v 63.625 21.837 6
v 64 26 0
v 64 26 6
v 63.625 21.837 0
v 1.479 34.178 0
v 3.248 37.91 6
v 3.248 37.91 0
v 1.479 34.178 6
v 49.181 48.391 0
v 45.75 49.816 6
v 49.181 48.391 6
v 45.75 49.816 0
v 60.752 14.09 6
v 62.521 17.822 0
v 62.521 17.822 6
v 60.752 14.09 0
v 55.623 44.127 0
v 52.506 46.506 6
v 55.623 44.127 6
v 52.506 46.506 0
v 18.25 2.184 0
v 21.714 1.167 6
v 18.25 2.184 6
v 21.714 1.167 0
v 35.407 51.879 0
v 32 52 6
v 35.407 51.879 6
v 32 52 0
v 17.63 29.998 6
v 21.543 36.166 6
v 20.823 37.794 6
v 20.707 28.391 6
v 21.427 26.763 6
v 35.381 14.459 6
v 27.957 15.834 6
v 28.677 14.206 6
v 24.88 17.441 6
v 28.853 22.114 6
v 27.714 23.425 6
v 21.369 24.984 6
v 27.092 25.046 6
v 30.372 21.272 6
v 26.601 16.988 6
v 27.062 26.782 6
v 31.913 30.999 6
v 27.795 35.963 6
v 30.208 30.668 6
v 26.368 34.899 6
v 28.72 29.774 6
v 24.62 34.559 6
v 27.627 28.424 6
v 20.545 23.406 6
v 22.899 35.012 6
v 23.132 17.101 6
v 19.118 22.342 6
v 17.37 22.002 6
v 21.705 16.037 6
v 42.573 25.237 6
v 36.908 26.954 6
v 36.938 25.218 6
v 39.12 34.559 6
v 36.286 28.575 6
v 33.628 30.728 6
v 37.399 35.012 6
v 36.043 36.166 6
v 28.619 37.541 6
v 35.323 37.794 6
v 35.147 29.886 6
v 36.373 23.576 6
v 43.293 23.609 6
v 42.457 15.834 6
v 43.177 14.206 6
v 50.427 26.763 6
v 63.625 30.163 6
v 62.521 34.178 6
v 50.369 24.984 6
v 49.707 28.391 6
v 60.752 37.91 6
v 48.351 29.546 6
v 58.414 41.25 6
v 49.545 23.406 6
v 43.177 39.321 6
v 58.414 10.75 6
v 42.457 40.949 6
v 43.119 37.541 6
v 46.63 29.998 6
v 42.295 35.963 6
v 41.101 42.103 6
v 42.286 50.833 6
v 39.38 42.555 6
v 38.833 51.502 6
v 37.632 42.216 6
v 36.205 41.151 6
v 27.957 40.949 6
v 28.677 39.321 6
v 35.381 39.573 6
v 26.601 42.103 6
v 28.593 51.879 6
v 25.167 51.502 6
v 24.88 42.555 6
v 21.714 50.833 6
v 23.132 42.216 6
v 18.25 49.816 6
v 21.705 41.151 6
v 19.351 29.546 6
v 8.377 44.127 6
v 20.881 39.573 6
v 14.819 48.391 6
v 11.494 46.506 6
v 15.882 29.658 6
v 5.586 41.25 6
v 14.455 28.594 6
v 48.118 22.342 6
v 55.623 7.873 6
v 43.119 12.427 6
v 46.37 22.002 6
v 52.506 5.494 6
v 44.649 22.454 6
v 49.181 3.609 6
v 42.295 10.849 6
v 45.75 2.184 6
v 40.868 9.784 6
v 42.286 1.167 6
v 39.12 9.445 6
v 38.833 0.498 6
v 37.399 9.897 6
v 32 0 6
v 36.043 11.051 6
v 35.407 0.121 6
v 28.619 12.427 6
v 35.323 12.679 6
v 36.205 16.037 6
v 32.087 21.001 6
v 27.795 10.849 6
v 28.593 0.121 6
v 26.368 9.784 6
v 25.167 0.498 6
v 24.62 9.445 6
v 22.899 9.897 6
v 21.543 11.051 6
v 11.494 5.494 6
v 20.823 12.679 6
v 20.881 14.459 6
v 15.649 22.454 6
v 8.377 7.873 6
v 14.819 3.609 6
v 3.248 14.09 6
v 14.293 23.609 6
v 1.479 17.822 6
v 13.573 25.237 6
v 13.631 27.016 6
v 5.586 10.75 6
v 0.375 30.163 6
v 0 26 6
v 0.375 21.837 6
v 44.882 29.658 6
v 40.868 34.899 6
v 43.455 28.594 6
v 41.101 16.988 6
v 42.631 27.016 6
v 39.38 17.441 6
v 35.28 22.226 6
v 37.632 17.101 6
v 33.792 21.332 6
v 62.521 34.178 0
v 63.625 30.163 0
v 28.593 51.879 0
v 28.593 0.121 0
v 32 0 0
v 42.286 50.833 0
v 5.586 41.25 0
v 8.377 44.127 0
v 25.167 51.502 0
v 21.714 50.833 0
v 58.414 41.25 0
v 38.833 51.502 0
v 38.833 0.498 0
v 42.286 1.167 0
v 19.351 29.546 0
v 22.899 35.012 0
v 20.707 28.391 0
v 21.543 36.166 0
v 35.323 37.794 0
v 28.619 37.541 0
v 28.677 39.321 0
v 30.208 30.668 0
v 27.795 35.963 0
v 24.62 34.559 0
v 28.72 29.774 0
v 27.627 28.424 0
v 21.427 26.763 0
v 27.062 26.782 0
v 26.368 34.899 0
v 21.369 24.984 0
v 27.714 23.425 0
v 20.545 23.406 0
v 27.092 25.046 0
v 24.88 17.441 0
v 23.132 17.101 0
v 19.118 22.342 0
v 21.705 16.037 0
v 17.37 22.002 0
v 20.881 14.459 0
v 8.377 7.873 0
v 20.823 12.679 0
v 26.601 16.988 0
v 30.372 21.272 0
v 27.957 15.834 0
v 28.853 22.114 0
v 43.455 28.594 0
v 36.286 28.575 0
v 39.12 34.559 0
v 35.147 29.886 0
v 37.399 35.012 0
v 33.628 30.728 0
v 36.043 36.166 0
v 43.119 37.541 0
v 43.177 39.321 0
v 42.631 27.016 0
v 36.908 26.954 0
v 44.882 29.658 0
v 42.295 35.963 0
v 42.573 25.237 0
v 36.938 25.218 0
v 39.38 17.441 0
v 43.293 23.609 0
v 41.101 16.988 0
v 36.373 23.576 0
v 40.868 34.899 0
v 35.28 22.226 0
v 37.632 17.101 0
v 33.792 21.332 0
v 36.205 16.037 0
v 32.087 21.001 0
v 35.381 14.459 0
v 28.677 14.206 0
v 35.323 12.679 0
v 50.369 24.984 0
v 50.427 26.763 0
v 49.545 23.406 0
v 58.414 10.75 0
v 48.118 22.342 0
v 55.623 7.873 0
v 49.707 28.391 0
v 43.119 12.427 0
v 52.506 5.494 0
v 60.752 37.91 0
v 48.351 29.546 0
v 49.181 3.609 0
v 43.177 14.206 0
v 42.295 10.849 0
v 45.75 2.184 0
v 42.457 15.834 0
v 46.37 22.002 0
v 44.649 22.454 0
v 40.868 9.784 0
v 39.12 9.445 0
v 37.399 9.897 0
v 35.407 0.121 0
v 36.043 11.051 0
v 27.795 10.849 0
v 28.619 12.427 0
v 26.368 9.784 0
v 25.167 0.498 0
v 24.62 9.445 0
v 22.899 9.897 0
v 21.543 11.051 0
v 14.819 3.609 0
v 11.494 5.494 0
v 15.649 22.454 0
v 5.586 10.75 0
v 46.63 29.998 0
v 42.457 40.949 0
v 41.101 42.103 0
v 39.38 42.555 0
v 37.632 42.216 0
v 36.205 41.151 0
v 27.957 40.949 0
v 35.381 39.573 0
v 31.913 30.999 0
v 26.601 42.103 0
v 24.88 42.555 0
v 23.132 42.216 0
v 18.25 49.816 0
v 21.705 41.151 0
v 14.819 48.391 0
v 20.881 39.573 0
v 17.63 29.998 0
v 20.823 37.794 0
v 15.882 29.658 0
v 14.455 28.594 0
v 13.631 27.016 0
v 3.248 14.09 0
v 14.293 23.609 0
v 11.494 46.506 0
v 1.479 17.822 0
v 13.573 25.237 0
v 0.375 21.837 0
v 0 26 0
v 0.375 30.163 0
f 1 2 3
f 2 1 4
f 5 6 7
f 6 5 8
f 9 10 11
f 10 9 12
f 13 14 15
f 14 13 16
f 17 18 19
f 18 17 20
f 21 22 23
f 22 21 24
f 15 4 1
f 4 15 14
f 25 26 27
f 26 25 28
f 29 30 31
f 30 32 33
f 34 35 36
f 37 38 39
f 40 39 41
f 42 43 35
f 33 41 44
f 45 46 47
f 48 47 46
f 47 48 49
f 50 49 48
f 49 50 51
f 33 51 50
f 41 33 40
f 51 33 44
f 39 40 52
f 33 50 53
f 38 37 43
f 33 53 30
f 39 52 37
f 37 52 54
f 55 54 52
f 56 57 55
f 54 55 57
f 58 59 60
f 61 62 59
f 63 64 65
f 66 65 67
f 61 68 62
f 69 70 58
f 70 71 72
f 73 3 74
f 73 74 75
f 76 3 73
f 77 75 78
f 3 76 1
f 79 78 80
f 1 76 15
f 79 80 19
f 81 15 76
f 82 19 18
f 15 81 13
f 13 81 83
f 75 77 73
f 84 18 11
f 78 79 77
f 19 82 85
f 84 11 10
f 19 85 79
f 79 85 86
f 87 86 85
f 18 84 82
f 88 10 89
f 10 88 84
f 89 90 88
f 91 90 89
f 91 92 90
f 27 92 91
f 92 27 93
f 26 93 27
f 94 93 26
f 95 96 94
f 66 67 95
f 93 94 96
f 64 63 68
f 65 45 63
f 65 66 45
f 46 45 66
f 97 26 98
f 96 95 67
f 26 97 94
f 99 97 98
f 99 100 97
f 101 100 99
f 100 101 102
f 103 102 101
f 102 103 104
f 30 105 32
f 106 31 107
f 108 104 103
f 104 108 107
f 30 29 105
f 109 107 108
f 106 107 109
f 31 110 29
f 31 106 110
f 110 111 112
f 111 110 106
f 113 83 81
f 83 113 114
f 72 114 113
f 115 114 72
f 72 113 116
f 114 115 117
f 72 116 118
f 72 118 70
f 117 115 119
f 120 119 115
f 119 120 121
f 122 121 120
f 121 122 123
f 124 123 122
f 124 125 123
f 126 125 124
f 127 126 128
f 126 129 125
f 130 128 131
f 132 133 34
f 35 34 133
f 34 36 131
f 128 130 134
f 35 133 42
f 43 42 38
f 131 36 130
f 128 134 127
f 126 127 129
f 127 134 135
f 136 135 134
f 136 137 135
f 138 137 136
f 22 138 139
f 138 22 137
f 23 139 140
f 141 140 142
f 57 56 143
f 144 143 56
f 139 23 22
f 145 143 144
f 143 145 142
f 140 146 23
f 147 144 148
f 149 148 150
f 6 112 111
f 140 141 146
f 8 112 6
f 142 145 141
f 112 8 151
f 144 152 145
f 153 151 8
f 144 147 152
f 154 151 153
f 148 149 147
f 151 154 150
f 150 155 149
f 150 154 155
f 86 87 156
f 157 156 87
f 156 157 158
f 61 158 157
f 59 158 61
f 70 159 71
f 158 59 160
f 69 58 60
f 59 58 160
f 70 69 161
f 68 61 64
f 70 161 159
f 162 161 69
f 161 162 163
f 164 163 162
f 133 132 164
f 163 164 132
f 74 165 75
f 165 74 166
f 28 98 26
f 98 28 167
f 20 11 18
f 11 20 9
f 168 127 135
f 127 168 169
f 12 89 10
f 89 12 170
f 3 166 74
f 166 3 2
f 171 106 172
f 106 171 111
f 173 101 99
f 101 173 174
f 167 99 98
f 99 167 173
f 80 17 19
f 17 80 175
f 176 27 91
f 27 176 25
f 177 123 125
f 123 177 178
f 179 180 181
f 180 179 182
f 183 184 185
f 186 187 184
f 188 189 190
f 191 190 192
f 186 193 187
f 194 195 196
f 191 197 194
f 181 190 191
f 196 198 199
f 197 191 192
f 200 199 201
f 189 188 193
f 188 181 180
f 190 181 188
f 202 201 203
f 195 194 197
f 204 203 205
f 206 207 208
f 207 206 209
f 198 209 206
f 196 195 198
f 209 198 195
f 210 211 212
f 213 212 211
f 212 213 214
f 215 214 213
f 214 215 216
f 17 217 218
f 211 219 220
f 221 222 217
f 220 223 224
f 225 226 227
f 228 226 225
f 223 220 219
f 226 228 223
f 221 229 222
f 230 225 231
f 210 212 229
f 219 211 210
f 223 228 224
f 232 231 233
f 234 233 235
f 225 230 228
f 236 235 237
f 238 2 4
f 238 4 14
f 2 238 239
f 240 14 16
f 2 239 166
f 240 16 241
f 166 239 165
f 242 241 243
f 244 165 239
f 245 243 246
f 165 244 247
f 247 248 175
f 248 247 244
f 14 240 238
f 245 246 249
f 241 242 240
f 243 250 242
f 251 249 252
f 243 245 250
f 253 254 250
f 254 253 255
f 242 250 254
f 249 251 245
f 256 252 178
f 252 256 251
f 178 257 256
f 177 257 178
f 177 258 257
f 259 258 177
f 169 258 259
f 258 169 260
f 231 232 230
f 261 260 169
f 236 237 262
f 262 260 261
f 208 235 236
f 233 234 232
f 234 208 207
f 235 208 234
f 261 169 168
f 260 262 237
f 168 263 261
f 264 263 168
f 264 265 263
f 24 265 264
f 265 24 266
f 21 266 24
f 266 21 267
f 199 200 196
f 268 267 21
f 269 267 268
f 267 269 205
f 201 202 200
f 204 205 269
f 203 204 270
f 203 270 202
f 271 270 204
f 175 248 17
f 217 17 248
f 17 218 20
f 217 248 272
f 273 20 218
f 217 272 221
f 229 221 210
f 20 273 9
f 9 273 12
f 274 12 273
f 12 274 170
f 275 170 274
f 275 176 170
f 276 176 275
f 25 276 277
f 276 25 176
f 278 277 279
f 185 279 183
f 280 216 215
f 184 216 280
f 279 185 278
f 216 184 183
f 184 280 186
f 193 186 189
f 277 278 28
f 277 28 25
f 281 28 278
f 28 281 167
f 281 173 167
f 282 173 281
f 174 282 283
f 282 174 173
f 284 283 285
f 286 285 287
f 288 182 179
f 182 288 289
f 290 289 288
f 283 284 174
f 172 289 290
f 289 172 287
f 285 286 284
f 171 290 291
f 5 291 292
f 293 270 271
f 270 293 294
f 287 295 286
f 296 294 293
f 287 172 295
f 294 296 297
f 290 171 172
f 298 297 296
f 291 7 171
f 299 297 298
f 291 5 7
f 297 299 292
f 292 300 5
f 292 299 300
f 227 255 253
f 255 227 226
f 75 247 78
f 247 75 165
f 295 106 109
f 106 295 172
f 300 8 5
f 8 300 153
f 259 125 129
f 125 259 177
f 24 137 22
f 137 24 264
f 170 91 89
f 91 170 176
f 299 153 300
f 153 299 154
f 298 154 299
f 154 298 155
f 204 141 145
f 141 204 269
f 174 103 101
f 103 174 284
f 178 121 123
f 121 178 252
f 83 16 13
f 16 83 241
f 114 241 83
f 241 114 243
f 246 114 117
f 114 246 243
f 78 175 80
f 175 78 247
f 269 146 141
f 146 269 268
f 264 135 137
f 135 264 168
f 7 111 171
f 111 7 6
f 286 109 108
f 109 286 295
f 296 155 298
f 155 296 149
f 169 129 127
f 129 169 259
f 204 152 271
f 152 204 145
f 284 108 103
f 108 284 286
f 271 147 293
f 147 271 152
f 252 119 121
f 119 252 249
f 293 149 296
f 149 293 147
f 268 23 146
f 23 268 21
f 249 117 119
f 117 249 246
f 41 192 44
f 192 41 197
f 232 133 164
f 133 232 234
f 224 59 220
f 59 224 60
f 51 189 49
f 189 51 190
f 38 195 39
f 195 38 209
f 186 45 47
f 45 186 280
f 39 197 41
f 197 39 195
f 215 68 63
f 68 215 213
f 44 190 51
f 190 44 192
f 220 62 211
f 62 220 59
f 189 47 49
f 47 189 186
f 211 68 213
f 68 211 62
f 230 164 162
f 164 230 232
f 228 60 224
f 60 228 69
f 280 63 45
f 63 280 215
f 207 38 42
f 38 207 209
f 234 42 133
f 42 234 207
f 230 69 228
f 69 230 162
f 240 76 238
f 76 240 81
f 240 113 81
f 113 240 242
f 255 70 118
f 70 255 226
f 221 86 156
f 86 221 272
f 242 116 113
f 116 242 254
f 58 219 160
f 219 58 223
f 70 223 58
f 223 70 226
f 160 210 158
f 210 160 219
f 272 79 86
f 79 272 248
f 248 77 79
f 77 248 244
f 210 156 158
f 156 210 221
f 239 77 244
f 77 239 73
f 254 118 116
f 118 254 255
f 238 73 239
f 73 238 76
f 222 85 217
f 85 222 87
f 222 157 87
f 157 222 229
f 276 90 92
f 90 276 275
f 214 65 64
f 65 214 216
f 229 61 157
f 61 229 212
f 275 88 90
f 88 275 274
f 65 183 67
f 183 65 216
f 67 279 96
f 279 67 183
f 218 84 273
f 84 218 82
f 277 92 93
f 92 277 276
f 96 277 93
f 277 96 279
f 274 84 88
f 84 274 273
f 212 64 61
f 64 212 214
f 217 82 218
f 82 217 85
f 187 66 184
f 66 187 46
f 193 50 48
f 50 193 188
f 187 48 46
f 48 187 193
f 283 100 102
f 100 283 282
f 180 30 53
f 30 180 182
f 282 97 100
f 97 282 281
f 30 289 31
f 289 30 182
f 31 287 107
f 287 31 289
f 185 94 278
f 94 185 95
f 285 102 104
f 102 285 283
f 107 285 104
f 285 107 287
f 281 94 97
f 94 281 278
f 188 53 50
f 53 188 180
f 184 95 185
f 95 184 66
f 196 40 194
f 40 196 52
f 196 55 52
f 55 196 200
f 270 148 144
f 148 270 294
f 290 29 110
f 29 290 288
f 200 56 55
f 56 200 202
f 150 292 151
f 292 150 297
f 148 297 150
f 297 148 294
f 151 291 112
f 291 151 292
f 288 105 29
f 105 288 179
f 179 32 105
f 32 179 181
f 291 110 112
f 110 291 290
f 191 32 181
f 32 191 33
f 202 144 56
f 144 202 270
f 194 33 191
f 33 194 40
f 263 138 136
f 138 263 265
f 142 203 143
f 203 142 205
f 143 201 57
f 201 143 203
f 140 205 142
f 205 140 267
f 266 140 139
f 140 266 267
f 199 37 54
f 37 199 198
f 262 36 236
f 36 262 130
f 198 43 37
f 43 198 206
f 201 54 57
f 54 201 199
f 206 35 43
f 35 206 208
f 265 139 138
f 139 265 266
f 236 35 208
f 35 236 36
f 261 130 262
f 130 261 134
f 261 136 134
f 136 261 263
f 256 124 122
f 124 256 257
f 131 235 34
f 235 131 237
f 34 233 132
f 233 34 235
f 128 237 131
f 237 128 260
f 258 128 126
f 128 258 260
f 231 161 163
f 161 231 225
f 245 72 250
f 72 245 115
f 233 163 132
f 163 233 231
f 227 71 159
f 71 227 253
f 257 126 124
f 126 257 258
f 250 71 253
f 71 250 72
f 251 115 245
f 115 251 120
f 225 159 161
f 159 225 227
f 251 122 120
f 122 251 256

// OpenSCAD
$fn = 32;

// ----------------------------------------------------------------------
// Cam plate: double_lobe cam, base R24
// ----------------------------------------------------------------------

// --- parameters (mm) ---
base_r = 24;              // base circle radius
lobe_h = 8;               // cam lobe rise
bore_r = 5;               // shaft bore radius
plate_t = 6;              // plate thickness, Z (extrusion height)
ring_r = 14.5;            // lightening ring radius
bolt_r = 4;               // lightening hole radius

profile = [[64, 26], [63.625, 30.163], [62.521, 34.178], [60.752, 37.91], [58.414, 41.25], [55.623, 44.127], [52.506, 46.506], [49.181, 48.391], [45.75, 49.816], [42.286, 50.833], [38.833, 51.502], [35.407, 51.879], [32, 52], [28.593, 51.879], [25.167, 51.502], [21.714, 50.833], [18.25, 49.816], [14.819, 48.391], [11.494, 46.506], [8.377, 44.127], [5.586, 41.25], [3.248, 37.91], [1.479, 34.178], [0.375, 30.163], [0, 26], [0.375, 21.837], [1.479, 17.822], [3.248, 14.09], [5.586, 10.75], [8.377, 7.873], [11.494, 5.494], [14.819, 3.609], [18.25, 2.184], [21.714, 1.167], [25.167, 0.498], [28.593, 0.121], [32, 0], [35.407, 0.121], [38.833, 0.498], [42.286, 1.167], [45.75, 2.184], [49.181, 3.609], [52.506, 5.494], [55.623, 7.873], [58.414, 10.75], [60.752, 14.09], [62.521, 17.822], [63.625, 21.837]];  // primary outline, 48 points, counter clockwise
void_1 = [[36.908, 26.954], [36.286, 28.575], [35.147, 29.886], [33.628, 30.728], [31.913, 30.999], [30.208, 30.668], [28.72, 29.774], [27.627, 28.424], [27.062, 26.782], [27.092, 25.046], [27.714, 23.425], [28.853, 22.114], [30.372, 21.272], [32.087, 21.001], [33.792, 21.332], [35.28, 22.226], [36.373, 23.576], [36.938, 25.218]];  // shaft bore, 18 points
void_2 = [[50.427, 26.763], [49.707, 28.391], [48.351, 29.546], [46.63, 29.998], [44.882, 29.658], [43.455, 28.594], [42.631, 27.016], [42.573, 25.237], [43.293, 23.609], [44.649, 22.454], [46.37, 22.002], [48.118, 22.342], [49.545, 23.406], [50.369, 24.984]];  // lightening hole 1, 14 points
void_3 = [[43.177, 39.321], [42.457, 40.949], [41.101, 42.103], [39.38, 42.555], [37.632, 42.216], [36.205, 41.151], [35.381, 39.573], [35.323, 37.794], [36.043, 36.166], [37.399, 35.012], [39.12, 34.559], [40.868, 34.899], [42.295, 35.963], [43.119, 37.541]];  // lightening hole 2, 14 points
void_4 = [[28.677, 39.321], [27.957, 40.949], [26.601, 42.103], [24.88, 42.555], [23.132, 42.216], [21.705, 41.151], [20.881, 39.573], [20.823, 37.794], [21.543, 36.166], [22.899, 35.012], [24.62, 34.559], [26.368, 34.899], [27.795, 35.963], [28.619, 37.541]];  // lightening hole 3, 14 points
void_5 = [[21.427, 26.763], [20.707, 28.391], [19.351, 29.546], [17.63, 29.998], [15.882, 29.658], [14.455, 28.594], [13.631, 27.016], [13.573, 25.237], [14.293, 23.609], [15.649, 22.454], [17.37, 22.002], [19.118, 22.342], [20.545, 23.406], [21.369, 24.984]];  // lightening hole 4, 14 points
void_6 = [[28.677, 14.206], [27.957, 15.834], [26.601, 16.988], [24.88, 17.441], [23.132, 17.101], [21.705, 16.037], [20.881, 14.459], [20.823, 12.679], [21.543, 11.051], [22.899, 9.897], [24.62, 9.445], [26.368, 9.784], [27.795, 10.849], [28.619, 12.427]];  // lightening hole 5, 14 points
void_7 = [[43.177, 14.206], [42.457, 15.834], [41.101, 16.988], [39.38, 17.441], [37.632, 17.101], [36.205, 16.037], [35.381, 14.459], [35.323, 12.679], [36.043, 11.051], [37.399, 9.897], [39.12, 9.445], [40.868, 9.784], [42.295, 10.849], [43.119, 12.427]];  // lightening hole 6, 14 points

// --- the one profile operation ---
difference() {
  linear_extrude(height = plate_t) polygon(points = profile);
  translate([0, 0, -1])
    linear_extrude(height = plate_t + 2) polygon(points = void_1);
  translate([0, 0, -1])
    linear_extrude(height = plate_t + 2) polygon(points = void_2);
  translate([0, 0, -1])
    linear_extrude(height = plate_t + 2) polygon(points = void_3);
  translate([0, 0, -1])
    linear_extrude(height = plate_t + 2) polygon(points = void_4);
  translate([0, 0, -1])
    linear_extrude(height = plate_t + 2) polygon(points = void_5);
  translate([0, 0, -1])
    linear_extrude(height = plate_t + 2) polygon(points = void_6);
  translate([0, 0, -1])
    linear_extrude(height = plate_t + 2) polygon(points = void_7);
}
